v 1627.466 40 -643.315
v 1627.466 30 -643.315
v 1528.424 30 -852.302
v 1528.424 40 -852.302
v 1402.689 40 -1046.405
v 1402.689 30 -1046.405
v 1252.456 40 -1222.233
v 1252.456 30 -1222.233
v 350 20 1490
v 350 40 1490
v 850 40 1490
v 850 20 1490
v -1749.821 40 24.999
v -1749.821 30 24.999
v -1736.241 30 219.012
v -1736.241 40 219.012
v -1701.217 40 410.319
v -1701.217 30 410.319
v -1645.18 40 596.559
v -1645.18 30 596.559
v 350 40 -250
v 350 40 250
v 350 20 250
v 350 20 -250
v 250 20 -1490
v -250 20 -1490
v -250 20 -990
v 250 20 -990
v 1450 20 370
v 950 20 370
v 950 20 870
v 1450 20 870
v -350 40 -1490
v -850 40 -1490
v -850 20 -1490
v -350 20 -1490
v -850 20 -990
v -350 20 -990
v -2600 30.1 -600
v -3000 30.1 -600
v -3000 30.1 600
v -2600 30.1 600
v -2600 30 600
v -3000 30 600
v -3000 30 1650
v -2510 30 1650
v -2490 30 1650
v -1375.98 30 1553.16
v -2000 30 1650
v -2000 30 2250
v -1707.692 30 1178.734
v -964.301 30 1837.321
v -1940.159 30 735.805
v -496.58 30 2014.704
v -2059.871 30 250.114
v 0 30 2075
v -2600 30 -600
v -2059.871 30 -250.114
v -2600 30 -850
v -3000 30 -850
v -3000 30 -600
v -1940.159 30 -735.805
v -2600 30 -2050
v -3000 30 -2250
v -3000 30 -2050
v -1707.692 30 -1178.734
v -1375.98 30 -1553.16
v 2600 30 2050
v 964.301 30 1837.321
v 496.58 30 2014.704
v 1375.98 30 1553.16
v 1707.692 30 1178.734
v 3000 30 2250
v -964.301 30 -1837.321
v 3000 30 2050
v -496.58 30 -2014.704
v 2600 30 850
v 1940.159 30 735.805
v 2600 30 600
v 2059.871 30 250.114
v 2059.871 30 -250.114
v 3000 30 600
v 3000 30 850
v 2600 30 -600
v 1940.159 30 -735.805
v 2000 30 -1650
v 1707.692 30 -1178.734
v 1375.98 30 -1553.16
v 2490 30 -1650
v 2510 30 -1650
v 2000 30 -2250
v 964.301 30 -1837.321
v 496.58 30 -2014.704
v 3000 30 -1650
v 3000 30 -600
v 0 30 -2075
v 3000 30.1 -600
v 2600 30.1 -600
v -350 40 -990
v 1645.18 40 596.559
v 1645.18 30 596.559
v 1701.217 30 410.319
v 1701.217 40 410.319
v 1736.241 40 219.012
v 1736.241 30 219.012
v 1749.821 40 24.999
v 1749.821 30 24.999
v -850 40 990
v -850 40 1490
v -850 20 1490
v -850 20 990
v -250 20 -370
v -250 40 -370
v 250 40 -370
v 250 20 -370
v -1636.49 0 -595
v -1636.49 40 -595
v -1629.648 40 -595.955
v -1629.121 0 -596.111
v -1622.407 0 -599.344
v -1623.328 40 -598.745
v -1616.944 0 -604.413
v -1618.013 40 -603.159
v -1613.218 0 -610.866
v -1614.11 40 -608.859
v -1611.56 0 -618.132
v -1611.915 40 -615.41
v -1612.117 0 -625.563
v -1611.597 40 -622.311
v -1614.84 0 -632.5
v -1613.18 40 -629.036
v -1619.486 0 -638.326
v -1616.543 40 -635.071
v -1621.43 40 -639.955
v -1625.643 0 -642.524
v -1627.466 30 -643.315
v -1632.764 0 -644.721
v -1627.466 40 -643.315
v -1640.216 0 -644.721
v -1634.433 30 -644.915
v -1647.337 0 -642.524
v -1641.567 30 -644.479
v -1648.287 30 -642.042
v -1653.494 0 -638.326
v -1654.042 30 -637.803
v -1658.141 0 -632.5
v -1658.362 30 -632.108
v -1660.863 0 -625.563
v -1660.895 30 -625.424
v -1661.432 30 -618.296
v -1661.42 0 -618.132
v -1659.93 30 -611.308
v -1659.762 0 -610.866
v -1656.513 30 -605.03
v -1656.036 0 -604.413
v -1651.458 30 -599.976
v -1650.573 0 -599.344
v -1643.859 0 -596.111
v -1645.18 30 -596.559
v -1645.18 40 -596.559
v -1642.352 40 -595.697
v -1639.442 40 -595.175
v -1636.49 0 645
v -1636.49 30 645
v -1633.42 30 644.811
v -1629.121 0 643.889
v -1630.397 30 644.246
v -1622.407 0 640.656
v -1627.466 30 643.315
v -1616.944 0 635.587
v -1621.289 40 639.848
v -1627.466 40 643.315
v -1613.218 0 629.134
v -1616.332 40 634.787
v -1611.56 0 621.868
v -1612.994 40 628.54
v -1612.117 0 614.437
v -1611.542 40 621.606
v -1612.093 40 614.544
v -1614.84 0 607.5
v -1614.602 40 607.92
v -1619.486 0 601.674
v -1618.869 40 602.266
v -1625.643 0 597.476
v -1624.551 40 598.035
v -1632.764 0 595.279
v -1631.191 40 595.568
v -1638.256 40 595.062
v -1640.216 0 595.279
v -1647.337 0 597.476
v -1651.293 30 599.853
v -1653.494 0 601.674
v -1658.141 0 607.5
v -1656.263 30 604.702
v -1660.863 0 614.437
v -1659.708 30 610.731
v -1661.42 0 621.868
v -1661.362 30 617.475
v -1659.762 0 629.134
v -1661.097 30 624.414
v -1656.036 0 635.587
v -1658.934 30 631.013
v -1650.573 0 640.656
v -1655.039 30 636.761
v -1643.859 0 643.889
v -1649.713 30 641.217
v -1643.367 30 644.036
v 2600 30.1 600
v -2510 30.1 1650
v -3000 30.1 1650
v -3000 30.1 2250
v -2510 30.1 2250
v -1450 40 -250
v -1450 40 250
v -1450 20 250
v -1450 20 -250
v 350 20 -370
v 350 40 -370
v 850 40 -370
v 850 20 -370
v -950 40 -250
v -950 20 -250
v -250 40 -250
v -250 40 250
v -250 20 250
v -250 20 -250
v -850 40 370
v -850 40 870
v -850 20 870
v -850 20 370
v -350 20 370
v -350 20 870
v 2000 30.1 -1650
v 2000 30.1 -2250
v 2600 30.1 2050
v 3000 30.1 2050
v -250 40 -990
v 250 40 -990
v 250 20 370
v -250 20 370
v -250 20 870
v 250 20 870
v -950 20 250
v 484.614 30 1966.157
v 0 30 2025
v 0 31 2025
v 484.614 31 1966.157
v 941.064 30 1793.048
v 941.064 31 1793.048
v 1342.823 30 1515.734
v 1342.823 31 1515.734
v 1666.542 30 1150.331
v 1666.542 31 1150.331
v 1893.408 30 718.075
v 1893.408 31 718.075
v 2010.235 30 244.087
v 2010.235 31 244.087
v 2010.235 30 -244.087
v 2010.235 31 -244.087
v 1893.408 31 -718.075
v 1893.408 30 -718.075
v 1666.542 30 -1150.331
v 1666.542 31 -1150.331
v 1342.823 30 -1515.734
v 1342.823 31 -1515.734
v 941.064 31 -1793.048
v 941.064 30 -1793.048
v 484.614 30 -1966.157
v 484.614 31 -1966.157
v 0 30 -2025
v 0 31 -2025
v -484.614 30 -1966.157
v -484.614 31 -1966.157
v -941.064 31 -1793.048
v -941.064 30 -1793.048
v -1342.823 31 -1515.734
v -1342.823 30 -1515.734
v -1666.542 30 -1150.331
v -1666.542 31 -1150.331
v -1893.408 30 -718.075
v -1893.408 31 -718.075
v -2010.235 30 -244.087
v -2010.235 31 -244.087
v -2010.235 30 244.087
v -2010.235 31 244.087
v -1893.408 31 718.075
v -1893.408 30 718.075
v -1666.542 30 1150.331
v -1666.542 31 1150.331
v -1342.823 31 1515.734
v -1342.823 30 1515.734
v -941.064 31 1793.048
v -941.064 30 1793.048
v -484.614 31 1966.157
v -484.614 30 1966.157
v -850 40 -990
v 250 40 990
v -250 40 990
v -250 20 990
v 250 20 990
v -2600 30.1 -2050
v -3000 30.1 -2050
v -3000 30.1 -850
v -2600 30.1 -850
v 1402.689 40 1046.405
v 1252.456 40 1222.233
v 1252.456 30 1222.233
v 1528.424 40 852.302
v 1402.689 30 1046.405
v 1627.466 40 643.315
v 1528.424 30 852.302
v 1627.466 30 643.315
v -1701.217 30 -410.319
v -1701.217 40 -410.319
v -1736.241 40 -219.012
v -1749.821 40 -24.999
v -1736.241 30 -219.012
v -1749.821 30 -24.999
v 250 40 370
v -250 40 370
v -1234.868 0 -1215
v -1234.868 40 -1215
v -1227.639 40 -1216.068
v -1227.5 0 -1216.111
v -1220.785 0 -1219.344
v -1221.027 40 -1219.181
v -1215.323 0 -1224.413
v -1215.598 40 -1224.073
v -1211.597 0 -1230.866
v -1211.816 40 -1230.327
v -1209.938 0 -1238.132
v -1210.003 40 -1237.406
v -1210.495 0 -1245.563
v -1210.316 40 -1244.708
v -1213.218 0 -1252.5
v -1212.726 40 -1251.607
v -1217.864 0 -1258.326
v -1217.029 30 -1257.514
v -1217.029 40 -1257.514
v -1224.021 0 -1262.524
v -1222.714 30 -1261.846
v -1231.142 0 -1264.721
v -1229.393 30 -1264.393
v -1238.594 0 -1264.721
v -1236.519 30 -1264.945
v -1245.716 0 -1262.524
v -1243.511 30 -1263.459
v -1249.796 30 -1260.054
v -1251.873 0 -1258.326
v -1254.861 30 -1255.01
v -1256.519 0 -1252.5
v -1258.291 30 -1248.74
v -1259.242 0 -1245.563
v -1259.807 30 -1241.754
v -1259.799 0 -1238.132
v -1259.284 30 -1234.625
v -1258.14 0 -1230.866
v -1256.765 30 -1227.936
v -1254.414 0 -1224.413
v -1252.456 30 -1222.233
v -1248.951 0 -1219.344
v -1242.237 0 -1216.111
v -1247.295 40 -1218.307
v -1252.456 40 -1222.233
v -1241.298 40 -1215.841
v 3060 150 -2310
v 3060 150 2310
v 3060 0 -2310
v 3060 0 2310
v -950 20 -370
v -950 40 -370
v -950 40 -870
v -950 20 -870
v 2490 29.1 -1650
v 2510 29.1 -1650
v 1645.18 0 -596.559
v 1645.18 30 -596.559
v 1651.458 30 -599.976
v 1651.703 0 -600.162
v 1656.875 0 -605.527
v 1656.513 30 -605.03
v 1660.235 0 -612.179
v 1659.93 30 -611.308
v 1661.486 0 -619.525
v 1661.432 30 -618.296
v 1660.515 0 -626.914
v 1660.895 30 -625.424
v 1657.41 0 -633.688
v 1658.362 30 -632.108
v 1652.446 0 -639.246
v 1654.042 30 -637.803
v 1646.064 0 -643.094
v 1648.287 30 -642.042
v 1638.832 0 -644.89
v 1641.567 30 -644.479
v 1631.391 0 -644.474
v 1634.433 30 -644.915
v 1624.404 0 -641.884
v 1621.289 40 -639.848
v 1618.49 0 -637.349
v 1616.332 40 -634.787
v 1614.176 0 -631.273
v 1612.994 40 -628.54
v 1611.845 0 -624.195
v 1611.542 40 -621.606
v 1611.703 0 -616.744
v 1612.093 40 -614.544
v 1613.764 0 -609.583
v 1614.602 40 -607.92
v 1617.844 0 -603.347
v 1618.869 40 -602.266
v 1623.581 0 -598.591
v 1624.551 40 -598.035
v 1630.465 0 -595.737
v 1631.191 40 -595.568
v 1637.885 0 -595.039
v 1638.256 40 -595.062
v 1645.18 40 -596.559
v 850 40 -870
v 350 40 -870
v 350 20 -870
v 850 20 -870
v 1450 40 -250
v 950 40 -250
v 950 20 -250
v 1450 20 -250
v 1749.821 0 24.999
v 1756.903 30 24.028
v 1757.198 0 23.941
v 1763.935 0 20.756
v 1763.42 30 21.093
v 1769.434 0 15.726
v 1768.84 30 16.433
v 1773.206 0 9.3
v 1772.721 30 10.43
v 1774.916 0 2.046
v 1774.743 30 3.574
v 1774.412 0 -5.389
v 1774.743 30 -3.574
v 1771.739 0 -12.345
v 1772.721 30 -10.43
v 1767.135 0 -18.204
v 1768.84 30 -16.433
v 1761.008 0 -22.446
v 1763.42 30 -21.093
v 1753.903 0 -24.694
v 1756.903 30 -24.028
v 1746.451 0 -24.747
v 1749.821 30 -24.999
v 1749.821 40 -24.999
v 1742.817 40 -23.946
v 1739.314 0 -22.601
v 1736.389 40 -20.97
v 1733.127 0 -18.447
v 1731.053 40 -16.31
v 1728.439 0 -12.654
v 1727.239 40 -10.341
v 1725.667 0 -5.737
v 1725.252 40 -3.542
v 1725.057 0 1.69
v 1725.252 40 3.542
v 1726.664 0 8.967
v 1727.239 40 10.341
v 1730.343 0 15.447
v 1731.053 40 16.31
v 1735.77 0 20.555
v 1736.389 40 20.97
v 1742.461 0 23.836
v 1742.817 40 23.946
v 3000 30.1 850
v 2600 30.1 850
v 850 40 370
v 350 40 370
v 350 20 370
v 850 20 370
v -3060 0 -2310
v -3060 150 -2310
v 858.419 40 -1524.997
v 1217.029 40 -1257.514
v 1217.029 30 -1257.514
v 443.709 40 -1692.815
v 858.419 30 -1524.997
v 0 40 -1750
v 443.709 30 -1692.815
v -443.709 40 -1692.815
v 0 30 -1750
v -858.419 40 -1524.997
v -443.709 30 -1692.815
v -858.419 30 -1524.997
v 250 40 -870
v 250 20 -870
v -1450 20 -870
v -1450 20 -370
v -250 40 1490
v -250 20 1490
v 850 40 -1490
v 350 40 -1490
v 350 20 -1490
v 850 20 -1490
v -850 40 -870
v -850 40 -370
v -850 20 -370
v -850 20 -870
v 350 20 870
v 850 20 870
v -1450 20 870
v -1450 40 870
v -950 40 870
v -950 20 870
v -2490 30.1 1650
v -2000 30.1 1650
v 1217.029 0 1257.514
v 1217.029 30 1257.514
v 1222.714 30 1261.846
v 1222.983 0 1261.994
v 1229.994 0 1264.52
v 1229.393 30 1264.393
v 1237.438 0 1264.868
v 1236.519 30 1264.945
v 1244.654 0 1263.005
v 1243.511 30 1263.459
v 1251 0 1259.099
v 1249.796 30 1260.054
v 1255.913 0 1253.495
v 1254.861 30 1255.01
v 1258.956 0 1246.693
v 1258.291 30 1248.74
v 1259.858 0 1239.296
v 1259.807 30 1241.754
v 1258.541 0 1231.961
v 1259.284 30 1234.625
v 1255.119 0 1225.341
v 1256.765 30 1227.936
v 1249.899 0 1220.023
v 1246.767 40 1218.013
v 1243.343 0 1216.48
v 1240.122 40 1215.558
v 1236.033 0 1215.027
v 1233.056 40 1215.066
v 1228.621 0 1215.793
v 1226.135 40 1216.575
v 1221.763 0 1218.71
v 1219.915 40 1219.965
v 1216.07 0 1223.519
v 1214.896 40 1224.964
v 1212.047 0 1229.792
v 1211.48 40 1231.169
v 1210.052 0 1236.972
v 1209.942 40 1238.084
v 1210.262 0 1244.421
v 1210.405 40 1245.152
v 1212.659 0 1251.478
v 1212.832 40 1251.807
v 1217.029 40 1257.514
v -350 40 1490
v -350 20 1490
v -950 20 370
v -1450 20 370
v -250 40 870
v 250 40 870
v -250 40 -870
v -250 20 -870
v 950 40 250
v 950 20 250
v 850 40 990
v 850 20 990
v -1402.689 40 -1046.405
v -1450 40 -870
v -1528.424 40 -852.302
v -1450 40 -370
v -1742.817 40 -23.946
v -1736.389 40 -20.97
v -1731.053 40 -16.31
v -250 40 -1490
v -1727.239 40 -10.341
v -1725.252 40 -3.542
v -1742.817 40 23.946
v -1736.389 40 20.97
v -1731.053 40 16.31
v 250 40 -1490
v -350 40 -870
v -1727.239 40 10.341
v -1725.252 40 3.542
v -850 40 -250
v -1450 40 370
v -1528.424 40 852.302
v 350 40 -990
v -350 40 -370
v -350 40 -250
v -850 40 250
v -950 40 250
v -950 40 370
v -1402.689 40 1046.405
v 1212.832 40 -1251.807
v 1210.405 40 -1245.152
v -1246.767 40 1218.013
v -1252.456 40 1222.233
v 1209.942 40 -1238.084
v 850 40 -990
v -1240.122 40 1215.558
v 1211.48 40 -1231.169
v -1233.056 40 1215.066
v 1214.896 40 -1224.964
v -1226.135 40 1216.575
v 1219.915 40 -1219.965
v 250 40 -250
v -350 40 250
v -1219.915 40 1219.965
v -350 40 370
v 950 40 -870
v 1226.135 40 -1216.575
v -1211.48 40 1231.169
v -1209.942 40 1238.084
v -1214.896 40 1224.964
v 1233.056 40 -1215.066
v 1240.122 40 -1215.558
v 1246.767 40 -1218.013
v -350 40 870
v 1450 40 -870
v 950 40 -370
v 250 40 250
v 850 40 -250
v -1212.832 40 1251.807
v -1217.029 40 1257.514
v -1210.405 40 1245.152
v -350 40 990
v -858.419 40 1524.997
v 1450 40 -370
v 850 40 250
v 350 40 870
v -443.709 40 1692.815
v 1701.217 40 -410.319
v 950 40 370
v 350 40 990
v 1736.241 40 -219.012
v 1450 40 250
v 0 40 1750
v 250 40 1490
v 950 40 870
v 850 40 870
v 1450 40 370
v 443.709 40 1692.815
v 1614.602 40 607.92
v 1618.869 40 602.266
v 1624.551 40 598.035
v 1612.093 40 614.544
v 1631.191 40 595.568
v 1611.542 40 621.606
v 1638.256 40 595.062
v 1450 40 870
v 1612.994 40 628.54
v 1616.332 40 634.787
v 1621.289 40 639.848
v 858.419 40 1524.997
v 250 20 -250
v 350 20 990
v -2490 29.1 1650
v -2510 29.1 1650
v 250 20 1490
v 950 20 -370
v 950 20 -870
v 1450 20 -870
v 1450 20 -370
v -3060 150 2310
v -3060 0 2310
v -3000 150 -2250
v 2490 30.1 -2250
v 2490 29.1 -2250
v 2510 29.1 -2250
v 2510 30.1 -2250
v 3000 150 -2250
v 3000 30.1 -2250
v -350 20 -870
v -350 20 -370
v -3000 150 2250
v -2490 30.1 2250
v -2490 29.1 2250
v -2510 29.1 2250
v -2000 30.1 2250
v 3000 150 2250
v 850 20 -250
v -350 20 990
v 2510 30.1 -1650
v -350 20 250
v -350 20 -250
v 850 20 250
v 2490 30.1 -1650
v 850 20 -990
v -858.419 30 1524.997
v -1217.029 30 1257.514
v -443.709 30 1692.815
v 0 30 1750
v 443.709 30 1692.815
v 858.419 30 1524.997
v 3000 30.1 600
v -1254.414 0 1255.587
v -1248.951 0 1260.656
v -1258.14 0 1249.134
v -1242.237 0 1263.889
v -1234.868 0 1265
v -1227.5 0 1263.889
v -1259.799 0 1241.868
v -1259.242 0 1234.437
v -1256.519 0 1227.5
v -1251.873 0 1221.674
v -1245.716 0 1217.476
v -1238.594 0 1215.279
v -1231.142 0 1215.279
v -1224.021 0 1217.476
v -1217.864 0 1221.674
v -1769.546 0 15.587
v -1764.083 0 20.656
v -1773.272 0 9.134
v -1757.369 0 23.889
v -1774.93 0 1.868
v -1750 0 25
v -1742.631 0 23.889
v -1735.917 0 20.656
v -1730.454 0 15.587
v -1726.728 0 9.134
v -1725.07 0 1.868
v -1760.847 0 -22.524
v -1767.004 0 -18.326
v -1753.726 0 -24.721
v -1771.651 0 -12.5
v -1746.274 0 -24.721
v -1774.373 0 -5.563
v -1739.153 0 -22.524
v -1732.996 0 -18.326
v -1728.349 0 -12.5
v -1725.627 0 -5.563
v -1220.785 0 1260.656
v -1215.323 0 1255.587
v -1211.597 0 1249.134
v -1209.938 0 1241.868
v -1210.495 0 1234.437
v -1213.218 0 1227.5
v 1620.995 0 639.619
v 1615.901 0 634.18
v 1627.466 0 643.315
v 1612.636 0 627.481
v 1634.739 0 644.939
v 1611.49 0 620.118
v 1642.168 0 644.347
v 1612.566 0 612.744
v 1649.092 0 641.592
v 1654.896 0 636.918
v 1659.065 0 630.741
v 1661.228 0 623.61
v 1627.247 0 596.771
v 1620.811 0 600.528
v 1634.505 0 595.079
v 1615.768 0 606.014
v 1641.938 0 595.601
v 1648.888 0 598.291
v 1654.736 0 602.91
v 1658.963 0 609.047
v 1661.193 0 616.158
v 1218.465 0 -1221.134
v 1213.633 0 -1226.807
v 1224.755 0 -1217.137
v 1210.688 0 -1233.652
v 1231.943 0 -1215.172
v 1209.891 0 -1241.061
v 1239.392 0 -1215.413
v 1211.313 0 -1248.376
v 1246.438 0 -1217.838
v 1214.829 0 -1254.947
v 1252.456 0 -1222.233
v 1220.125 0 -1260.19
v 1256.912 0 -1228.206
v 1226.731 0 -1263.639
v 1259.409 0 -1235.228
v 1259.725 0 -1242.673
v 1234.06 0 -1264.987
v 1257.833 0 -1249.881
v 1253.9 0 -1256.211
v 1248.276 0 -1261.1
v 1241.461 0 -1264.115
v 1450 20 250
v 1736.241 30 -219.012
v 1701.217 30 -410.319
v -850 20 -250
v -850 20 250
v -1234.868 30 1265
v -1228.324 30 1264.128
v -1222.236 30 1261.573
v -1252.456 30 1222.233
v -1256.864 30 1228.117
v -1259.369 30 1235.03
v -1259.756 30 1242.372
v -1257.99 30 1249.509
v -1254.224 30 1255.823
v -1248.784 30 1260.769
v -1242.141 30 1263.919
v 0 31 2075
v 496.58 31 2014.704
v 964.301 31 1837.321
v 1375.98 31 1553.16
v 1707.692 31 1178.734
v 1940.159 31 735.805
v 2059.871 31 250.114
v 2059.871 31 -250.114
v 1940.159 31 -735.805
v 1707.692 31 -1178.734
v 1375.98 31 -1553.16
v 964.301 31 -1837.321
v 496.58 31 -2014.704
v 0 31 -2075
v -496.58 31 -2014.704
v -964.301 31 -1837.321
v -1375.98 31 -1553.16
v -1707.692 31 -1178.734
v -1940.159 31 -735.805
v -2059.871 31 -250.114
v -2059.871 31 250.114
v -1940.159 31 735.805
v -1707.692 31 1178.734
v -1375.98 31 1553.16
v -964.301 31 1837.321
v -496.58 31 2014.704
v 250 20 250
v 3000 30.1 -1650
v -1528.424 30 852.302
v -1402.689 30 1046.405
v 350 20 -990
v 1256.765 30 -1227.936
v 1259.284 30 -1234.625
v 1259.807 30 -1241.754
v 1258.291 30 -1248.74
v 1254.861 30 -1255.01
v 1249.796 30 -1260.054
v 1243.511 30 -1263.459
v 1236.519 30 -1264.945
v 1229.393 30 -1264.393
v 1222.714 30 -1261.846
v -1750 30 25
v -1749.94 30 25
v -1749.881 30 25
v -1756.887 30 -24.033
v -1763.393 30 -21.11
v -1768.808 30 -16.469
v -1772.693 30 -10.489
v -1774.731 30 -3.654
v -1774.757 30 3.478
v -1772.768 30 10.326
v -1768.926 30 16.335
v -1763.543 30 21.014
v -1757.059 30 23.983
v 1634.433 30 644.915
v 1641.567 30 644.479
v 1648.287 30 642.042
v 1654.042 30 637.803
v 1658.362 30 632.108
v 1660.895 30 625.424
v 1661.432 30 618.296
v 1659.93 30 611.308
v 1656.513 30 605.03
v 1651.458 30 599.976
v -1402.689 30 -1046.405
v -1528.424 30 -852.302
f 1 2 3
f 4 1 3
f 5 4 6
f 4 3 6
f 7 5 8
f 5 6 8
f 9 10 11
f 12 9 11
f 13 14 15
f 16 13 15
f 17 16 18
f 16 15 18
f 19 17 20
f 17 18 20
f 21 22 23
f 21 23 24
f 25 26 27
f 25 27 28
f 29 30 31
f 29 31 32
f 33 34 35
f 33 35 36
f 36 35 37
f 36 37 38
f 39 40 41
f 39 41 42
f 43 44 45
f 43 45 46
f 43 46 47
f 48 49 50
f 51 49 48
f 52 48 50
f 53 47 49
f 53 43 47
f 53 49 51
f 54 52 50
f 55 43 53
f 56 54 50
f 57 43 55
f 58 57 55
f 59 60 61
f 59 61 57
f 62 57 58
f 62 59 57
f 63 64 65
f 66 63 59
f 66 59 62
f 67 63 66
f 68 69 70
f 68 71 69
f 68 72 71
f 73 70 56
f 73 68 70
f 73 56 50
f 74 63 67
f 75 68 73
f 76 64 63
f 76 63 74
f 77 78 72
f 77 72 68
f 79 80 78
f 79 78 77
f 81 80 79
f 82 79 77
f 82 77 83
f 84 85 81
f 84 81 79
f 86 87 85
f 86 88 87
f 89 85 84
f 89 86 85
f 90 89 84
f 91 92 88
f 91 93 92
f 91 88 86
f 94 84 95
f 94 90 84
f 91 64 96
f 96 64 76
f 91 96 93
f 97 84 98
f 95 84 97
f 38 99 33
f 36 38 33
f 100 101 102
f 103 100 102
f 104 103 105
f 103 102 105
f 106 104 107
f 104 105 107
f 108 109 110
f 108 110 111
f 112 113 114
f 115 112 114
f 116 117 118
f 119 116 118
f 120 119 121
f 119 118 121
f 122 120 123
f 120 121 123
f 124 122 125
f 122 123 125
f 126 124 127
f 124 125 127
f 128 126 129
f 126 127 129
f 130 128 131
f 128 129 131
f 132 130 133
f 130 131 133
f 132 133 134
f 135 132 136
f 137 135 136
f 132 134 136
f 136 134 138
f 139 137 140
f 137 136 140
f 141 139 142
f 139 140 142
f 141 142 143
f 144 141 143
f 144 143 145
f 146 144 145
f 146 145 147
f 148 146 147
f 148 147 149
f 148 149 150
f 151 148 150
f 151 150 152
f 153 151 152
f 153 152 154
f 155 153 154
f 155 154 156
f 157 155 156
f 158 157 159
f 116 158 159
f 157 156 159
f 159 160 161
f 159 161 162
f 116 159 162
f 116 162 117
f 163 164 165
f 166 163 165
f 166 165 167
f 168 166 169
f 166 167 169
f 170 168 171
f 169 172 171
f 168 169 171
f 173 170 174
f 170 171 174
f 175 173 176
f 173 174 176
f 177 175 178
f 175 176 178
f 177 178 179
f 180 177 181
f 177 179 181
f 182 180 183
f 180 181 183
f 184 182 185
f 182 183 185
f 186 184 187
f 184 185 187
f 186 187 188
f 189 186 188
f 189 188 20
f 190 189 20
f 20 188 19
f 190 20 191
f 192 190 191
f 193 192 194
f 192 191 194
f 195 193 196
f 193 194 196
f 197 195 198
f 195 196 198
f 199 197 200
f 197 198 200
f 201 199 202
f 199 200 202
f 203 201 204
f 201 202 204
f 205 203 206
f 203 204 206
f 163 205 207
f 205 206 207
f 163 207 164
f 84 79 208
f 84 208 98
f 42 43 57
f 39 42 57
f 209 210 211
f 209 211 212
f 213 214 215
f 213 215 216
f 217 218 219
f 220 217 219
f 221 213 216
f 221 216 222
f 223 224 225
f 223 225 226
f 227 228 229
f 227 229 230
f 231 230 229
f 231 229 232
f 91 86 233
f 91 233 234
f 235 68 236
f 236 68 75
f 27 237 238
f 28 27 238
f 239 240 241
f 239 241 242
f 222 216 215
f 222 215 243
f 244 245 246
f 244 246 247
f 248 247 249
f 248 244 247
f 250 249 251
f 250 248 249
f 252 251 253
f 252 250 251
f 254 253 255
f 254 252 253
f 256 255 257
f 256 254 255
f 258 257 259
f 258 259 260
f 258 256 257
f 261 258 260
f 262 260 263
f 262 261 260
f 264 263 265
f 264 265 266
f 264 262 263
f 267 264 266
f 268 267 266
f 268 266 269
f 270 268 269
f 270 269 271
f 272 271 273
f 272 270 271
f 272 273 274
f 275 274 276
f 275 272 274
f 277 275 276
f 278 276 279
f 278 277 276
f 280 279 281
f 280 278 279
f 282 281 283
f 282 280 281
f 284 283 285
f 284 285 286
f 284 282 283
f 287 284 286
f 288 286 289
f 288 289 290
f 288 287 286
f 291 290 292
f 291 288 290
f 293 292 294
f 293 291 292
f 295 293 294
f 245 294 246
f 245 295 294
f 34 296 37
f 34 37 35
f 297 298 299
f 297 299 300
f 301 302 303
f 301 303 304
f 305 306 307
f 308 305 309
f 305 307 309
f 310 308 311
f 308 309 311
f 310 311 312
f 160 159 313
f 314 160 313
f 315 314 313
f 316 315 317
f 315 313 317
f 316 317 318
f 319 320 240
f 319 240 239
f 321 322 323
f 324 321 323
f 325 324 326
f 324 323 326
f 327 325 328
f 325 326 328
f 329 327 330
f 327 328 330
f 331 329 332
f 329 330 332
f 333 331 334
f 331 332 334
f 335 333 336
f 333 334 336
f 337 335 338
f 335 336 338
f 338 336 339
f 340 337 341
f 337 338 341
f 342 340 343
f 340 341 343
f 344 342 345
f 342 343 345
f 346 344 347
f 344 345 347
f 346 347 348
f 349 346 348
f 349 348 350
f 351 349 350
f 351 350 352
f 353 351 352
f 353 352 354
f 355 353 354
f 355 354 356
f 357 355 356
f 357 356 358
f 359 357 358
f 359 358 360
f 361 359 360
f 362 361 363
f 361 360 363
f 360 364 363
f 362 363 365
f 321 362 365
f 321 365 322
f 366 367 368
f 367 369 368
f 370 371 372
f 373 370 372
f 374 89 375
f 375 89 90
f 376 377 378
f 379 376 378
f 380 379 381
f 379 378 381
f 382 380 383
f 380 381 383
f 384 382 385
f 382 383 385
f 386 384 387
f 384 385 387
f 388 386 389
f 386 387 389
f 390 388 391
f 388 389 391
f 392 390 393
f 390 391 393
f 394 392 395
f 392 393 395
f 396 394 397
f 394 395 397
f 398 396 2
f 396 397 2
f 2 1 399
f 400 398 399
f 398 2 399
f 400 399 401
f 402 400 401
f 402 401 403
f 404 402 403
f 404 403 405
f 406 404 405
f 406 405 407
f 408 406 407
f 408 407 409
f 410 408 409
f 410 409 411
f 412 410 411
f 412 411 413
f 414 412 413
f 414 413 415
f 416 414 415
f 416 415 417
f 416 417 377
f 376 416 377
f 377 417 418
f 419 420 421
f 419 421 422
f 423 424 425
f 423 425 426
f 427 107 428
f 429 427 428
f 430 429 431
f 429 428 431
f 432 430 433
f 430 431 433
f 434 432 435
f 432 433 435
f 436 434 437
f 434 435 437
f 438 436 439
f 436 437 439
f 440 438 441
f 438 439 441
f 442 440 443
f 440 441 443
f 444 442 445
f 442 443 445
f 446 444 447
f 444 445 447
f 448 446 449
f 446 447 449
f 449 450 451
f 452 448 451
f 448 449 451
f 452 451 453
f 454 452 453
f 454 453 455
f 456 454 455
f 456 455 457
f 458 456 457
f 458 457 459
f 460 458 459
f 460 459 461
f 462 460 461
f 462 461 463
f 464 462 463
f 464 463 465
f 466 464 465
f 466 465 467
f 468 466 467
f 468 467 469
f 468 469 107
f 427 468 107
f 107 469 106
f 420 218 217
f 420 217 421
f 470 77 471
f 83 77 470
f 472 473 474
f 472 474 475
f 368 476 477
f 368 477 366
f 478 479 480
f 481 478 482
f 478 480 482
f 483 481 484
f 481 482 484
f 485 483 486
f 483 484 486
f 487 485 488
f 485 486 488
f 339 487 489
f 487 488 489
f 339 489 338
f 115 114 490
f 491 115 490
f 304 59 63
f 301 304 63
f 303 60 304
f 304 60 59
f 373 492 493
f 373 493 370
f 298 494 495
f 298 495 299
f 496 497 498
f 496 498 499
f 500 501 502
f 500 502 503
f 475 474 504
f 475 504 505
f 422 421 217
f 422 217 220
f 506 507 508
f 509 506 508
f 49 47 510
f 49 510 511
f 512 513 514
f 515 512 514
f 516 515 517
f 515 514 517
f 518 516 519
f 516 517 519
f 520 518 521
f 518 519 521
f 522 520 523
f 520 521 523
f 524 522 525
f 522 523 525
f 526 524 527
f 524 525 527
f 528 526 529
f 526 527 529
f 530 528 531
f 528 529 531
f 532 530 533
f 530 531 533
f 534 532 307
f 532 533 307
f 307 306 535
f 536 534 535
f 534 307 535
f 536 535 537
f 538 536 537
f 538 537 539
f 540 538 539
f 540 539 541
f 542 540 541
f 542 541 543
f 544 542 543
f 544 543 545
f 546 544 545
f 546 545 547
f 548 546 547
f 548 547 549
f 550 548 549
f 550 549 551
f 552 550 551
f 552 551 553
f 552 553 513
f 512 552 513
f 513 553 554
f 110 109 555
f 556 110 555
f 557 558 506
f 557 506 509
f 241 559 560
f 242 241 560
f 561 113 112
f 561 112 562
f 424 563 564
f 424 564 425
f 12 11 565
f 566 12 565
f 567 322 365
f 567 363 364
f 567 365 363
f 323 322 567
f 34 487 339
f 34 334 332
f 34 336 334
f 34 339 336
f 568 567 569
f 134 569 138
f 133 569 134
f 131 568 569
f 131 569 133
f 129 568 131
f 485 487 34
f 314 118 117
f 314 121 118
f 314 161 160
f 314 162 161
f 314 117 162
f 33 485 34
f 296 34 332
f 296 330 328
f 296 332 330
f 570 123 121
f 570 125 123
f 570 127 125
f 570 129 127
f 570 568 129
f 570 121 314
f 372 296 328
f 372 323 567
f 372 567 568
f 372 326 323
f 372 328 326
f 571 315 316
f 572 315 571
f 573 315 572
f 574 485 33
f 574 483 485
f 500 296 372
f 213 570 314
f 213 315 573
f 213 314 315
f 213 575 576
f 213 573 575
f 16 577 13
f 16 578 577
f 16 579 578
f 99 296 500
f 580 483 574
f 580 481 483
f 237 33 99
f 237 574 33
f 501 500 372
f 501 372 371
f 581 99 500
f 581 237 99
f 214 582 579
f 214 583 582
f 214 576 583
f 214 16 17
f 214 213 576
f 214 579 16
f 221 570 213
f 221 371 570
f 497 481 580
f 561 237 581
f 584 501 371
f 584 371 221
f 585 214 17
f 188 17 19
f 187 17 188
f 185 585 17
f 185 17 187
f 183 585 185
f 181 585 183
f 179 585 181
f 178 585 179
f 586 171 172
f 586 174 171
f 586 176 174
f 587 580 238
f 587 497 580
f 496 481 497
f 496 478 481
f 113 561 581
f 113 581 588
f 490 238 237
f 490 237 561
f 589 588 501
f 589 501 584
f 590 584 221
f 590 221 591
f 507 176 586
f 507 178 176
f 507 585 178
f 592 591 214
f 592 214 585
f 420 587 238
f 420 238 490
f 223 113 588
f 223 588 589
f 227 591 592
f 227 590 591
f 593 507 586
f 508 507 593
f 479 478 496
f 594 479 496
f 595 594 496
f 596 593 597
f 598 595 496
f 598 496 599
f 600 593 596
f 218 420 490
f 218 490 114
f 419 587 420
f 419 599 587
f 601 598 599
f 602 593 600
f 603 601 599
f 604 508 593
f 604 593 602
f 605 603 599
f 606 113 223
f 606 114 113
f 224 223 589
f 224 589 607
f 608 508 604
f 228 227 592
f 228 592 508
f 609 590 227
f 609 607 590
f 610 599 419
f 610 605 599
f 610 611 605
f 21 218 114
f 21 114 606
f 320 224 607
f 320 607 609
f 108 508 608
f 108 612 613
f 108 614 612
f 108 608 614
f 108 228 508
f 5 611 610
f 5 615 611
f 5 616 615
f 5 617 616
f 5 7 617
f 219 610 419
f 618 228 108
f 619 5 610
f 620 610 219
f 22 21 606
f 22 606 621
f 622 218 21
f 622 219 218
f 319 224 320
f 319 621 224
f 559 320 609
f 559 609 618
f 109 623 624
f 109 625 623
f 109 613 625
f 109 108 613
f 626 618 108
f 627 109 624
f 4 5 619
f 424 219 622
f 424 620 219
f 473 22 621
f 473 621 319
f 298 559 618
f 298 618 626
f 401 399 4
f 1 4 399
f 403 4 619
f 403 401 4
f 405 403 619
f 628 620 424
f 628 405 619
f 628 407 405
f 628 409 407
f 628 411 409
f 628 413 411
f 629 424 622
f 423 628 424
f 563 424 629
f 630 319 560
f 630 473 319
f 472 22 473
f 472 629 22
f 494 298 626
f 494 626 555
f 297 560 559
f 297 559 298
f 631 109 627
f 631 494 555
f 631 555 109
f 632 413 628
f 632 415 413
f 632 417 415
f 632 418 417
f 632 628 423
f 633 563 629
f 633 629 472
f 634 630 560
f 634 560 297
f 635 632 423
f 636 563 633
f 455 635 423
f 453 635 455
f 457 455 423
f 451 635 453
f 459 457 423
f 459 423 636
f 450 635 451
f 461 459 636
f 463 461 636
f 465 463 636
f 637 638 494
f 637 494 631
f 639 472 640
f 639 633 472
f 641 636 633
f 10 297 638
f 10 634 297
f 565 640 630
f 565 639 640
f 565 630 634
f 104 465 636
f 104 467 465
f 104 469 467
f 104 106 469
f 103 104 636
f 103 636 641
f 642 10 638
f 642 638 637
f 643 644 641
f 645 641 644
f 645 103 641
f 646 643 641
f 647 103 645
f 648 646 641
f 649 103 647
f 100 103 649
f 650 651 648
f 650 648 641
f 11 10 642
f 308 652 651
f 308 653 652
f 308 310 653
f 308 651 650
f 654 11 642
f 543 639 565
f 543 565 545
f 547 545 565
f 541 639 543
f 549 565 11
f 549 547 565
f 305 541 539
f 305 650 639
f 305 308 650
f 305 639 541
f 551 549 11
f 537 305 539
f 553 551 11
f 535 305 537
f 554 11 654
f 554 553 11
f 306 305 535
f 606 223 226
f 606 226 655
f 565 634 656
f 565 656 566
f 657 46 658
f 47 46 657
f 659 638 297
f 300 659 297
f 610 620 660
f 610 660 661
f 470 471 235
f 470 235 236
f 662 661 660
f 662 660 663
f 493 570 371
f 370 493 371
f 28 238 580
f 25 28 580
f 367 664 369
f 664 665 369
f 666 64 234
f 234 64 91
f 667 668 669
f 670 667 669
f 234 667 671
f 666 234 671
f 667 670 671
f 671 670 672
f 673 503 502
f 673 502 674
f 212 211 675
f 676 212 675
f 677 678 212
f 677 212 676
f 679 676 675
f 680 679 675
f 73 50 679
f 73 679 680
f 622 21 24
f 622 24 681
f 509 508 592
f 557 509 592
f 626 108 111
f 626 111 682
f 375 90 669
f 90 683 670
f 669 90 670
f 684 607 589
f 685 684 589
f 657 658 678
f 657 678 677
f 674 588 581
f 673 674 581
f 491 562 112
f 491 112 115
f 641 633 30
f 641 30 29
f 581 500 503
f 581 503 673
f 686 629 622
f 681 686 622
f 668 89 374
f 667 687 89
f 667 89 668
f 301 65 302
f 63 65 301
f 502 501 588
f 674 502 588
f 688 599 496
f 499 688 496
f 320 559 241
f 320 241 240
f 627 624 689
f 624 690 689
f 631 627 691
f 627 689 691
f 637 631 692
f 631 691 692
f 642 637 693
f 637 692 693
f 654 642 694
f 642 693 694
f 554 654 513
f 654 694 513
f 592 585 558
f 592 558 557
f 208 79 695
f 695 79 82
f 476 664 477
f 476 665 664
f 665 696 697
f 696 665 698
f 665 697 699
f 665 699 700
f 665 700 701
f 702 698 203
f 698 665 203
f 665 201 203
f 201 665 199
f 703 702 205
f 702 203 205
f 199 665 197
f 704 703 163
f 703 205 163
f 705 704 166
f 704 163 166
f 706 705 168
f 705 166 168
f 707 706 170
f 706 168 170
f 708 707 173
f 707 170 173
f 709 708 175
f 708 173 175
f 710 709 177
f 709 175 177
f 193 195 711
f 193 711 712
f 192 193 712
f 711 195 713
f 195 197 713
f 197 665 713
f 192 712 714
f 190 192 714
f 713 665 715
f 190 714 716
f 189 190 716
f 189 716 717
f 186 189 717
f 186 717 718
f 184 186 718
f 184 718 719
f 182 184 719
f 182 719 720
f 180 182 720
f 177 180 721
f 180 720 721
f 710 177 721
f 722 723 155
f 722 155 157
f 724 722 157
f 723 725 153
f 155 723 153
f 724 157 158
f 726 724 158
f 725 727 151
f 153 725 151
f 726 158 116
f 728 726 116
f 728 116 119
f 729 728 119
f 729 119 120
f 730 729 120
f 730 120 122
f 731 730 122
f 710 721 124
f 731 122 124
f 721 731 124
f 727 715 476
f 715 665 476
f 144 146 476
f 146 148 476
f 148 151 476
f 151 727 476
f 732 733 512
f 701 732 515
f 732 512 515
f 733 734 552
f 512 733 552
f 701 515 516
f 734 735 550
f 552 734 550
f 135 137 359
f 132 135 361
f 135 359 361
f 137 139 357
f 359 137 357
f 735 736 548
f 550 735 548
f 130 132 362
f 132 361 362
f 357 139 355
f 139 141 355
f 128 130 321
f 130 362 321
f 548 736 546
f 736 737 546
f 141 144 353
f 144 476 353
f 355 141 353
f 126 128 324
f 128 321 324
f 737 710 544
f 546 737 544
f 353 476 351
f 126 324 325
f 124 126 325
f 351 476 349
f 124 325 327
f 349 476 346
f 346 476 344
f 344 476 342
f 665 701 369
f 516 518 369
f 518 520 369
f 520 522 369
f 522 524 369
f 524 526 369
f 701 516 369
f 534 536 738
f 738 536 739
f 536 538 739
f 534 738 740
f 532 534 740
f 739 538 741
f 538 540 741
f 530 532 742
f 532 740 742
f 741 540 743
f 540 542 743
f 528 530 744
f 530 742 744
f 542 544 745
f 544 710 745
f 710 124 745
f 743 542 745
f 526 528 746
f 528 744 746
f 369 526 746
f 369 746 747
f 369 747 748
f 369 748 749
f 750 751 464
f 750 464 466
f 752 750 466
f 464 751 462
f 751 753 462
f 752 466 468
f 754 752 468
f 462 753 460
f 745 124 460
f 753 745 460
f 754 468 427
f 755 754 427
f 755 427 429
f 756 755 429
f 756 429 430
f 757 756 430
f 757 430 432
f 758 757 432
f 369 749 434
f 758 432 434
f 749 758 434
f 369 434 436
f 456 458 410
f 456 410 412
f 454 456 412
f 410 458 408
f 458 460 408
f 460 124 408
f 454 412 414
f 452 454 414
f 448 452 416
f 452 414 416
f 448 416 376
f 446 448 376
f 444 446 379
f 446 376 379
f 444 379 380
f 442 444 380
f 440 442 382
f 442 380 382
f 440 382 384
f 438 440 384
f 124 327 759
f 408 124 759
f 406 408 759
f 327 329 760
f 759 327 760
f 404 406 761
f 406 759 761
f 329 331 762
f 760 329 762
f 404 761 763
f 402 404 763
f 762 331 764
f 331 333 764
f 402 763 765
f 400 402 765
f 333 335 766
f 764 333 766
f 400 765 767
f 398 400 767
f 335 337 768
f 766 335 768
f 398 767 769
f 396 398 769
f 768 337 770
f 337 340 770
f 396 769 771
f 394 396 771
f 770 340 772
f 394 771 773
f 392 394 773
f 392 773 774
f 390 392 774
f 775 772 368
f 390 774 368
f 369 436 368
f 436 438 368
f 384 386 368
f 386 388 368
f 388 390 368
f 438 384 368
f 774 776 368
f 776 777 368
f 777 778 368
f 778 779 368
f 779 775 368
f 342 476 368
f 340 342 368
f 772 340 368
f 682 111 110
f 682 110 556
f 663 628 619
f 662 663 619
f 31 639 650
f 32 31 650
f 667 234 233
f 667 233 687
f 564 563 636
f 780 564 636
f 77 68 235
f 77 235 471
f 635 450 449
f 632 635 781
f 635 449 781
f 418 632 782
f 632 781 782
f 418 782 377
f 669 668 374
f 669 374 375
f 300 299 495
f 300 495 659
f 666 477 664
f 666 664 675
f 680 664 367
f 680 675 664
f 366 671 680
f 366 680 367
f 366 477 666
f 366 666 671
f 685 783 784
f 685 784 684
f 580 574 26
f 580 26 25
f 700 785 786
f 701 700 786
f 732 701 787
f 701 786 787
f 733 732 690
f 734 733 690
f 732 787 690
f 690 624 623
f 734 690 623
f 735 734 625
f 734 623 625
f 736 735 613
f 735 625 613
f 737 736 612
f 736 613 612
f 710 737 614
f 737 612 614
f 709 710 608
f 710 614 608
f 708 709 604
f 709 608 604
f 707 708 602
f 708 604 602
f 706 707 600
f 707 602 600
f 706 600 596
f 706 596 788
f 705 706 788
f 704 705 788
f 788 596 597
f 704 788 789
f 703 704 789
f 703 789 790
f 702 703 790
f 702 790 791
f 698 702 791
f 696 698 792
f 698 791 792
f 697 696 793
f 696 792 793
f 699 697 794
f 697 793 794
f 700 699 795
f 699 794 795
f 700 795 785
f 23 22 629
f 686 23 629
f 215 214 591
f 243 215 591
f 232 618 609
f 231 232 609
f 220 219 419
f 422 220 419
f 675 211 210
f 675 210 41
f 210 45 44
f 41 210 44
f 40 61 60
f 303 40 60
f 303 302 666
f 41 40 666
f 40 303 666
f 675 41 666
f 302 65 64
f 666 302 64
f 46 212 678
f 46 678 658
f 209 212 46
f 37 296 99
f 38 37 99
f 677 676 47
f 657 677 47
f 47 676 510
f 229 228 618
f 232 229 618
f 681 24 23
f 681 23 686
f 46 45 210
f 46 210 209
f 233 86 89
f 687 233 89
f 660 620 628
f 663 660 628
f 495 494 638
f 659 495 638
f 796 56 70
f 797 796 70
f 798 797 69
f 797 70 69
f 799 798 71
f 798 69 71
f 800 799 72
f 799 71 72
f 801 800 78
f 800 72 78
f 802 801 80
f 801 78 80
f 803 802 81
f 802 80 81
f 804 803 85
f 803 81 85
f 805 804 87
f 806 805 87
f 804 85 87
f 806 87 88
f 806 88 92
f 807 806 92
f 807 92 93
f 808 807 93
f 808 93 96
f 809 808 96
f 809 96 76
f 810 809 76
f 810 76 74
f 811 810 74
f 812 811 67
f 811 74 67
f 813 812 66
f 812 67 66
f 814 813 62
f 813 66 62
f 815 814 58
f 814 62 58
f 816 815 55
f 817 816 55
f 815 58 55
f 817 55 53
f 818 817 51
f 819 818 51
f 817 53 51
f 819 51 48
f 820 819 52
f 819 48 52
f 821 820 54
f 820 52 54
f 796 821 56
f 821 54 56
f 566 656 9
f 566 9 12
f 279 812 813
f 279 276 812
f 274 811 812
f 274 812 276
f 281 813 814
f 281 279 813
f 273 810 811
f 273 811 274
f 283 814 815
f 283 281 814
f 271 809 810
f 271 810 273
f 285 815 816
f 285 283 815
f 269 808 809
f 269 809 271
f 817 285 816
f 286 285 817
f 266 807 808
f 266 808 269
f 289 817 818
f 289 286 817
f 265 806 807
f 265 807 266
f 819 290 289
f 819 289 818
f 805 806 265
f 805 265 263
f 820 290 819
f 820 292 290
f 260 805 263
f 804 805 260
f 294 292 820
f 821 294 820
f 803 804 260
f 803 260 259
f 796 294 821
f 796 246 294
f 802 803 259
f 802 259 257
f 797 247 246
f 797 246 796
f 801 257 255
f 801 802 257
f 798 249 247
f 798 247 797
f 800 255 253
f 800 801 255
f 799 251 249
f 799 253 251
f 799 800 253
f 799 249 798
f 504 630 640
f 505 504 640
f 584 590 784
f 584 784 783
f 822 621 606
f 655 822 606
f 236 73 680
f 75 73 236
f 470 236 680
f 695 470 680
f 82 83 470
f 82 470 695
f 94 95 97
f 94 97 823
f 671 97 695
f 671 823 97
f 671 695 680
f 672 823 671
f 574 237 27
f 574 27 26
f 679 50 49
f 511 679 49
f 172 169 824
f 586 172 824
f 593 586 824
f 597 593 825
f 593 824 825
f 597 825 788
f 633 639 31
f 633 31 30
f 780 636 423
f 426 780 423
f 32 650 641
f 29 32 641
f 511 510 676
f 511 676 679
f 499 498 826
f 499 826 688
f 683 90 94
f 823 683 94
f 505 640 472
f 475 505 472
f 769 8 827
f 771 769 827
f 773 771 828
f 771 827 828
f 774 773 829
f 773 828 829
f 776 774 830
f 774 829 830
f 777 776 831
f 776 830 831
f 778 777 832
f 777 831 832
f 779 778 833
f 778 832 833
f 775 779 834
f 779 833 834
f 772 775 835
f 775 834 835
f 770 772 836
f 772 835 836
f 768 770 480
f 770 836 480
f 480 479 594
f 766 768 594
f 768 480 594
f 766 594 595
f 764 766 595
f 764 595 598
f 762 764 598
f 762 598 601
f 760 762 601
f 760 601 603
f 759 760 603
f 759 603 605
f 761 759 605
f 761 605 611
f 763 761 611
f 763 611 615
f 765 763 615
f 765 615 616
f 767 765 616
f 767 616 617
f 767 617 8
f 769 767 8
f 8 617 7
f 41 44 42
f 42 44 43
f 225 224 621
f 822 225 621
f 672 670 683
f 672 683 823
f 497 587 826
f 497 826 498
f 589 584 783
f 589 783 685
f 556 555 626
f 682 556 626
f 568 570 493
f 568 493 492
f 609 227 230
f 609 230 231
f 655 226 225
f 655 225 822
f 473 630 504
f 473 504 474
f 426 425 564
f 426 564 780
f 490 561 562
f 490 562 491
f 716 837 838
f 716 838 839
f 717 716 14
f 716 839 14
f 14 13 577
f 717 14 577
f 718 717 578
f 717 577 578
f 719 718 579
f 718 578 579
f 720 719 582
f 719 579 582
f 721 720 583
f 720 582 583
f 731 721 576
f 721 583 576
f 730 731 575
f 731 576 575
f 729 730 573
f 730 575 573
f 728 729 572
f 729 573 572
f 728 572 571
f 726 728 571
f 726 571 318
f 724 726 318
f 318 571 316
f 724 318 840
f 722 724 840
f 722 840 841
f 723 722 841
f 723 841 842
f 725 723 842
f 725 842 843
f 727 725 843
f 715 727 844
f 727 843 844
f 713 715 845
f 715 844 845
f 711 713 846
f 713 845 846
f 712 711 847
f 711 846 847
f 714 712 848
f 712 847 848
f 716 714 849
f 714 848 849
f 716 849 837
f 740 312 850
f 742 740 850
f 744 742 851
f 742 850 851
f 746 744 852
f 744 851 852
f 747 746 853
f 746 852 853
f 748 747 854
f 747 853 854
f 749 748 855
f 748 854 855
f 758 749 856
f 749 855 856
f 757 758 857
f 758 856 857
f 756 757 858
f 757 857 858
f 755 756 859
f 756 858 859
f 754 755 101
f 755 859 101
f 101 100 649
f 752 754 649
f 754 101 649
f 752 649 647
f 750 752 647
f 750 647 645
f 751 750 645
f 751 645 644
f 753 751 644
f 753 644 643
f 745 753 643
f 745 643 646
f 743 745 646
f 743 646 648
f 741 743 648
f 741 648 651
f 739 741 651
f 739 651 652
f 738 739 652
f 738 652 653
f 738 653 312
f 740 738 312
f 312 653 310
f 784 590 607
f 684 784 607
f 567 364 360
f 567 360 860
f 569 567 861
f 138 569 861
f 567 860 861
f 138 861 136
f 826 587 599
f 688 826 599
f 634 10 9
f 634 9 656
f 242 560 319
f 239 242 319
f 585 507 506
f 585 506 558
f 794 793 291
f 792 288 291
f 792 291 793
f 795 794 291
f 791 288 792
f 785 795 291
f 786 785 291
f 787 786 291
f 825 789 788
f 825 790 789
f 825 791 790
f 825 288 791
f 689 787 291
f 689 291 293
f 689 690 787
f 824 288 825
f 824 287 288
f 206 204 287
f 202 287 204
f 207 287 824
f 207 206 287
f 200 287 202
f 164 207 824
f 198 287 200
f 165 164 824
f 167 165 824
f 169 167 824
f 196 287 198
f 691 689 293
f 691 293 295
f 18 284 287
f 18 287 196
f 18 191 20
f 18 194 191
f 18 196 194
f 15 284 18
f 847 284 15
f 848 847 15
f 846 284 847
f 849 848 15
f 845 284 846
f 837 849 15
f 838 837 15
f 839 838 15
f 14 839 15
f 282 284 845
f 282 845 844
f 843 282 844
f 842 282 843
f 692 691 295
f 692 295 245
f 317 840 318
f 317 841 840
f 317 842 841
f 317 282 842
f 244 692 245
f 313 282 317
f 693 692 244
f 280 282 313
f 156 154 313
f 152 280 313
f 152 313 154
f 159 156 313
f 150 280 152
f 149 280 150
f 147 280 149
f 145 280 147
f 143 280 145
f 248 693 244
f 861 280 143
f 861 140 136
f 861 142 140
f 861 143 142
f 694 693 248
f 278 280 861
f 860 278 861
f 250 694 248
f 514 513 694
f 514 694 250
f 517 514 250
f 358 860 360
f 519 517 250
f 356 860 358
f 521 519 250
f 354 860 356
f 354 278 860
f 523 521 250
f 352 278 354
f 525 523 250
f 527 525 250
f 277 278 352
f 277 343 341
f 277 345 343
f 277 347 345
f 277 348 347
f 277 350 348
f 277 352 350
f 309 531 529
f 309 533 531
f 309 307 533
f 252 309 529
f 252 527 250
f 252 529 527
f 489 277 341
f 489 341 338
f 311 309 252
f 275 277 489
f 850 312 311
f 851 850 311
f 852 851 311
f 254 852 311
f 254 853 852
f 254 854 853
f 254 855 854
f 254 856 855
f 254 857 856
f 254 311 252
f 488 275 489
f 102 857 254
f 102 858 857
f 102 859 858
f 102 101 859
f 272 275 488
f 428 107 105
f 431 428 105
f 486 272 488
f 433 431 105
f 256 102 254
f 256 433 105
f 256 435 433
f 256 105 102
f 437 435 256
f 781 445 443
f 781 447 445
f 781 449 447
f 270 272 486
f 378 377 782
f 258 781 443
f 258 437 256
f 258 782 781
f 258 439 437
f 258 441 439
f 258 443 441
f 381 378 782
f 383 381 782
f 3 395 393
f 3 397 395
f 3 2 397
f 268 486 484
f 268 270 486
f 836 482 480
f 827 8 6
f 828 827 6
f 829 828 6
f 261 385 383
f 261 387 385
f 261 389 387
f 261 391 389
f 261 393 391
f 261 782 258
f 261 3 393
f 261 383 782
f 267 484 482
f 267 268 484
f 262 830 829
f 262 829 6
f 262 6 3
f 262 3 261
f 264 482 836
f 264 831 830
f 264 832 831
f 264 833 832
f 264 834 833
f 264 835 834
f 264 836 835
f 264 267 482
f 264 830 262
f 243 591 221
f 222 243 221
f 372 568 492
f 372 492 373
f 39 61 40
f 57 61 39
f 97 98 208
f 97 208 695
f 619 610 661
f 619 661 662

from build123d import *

# Parameters (mm, degrees)
SKETCH1_W           = 6120
SKETCH1_H           = 4620
BOSS_EXTRUDE1_DEPTH = 30
SKETCH2_W           = 6120
SKETCH2_H           = 4620
SKETCH2_W_2         = 6000
SKETCH2_H_2         = 4500
BOSS_EXTRUDE2_DEPTH = 120
SKETCH3_R           = 1750
BOSS_EXTRUDE3_DEPTH = 10
SKETCH4_W           = 500
SKETCH4_H           = 500
CUT_EXTRUDE1_DEPTH  = 20
SKETCH12_R          = 2075
SKETCH12_R_2        = 2025
BOSS_EXTRUDE8_DEPTH = 1
SKETCH13_W          = 1000
SKETCH13_H          = 600
SKETCH13_W_2        = 400
SKETCH13_H_2        = 1200
BOSS_EXTRUDE9_DEPTH = 0.1
SKETCH14_R          = 25
CUT_EXTRUDE2_DEPTH  = 40
SKETCH15_W          = 20
SKETCH15_H          = 600
CUT_EXTRUDE3_DEPTH  = 1


with BuildPart() as part:
    # Sketch1 → Boss-Extrude1 (new body)
    with BuildSketch(Plane(origin=(0, 0, 0), x_dir=(1, 0, 0), z_dir=(0, 1, 0))):
        Rectangle(SKETCH1_W, SKETCH1_H)
    extrude(amount=BOSS_EXTRUDE1_DEPTH)

    # Sketch2 → Boss-Extrude2 (add)
    with BuildSketch(Plane(origin=(0, 30, 0), x_dir=(1, 0, 0), z_dir=(0, 1, 0))):
        Rectangle(SKETCH2_W, SKETCH2_H)
        Rectangle(SKETCH2_W_2, SKETCH2_H_2, mode=Mode.SUBTRACT)
    extrude(amount=BOSS_EXTRUDE2_DEPTH)

    # Sketch3 → Boss-Extrude3 (add)
    with BuildSketch(Plane(origin=(0, 30, 0), x_dir=(1, 0, 0), z_dir=(0, 1, 0))):
        with Locations(Location((0, 0, 0), (0, 0, 270))):
            Circle(SKETCH3_R)
    extrude(amount=BOSS_EXTRUDE3_DEPTH)

    # Sketch4 → Cut-Extrude1 (cut)
    with BuildSketch(Plane(origin=(0, 40, 0), x_dir=(1, 0, 0), z_dir=(0, 1, 0))):
        with Locations((600, 0)):
            Rectangle(SKETCH4_W, SKETCH4_H)
        Rectangle(SKETCH4_W, SKETCH4_H)
        with Locations((1200, 0)):
            Rectangle(SKETCH4_W, SKETCH4_H)
        with Locations((-1200, 0)):
            Rectangle(SKETCH4_W, SKETCH4_H)
        with Locations((-600, 0)):
            Rectangle(SKETCH4_W, SKETCH4_H)
        with Locations((0, 620)):
            Rectangle(SKETCH4_W, SKETCH4_H)
        with Locations((-600, 620)):
            Rectangle(SKETCH4_W, SKETCH4_H)
        with Locations((600, 620)):
            Rectangle(SKETCH4_W, SKETCH4_H)
        with Locations((0, 1240)):
            Rectangle(SKETCH4_W, SKETCH4_H)
        with Locations((-600, 1240)):
            Rectangle(SKETCH4_W, SKETCH4_H)
        with Locations((600, 1240)):
            Rectangle(SKETCH4_W, SKETCH4_H)
        with Locations((600, -1240)):
            Rectangle(SKETCH4_W, SKETCH4_H)
        with Locations((-600, -1240)):
            Rectangle(SKETCH4_W, SKETCH4_H)
        with Locations((0, -1240)):
            Rectangle(SKETCH4_W, SKETCH4_H)
        with Locations((600, -620)):
            Rectangle(SKETCH4_W, SKETCH4_H)
        with Locations((-600, -620)):
            Rectangle(SKETCH4_W, SKETCH4_H)
        with Locations((0, -620)):
            Rectangle(SKETCH4_W, SKETCH4_H)
        with Locations((-1200, 620)):
            Rectangle(SKETCH4_W, SKETCH4_H)
        with Locations((1200, 620)):
            Rectangle(SKETCH4_W, SKETCH4_H)
        with Locations((1200, -620)):
            Rectangle(SKETCH4_W, SKETCH4_H)
        with Locations((-1200, -620)):
            Rectangle(SKETCH4_W, SKETCH4_H)
    extrude(amount=-CUT_EXTRUDE1_DEPTH, mode=Mode.SUBTRACT)

    # Sketch12 → Boss-Extrude8 (add)
    with BuildSketch(Plane(origin=(0, 30, 0), x_dir=(1, 0, 0), z_dir=(0, 1, 0))):
        with Locations(Location((0, 0, 0), (0, 0, 270))):
            Circle(SKETCH12_R)
        with Locations(Location((0, 0, 0), (0, 0, 270))):
            Circle(SKETCH12_R_2, mode=Mode.SUBTRACT)
    extrude(amount=BOSS_EXTRUDE8_DEPTH)

    # Sketch13 → Boss-Extrude9 (add)
    with BuildSketch(Plane(origin=(0, 30, 0), x_dir=(1, 0, 0), z_dir=(0, 1, 0))):
        with Locations((-2500, -1950)):
            Rectangle(SKETCH13_W, SKETCH13_H)
        with Locations((-2800, 0)):
            Rectangle(SKETCH13_W_2, SKETCH13_H_2)
        with Locations((-2800, 1450)):
            Rectangle(SKETCH13_W_2, SKETCH13_H_2)
        with Locations((2500, 1950)):
            Rectangle(SKETCH13_W, SKETCH13_H)
        with Locations((2800, 0)):
            Rectangle(SKETCH13_W_2, SKETCH13_H_2)
        with Locations((2800, -1450)):
            Rectangle(SKETCH13_W_2, SKETCH13_H_2)
    extrude(amount=BOSS_EXTRUDE9_DEPTH)

    # Sketch14 → Cut-Extrude2 (cut)
    with BuildSketch(Plane(origin=(0, 40, 0), x_dir=(1, 0, 0), z_dir=(0, 1, 0))):
        with Locations(Location((-1636.490146625, -620, 0), (0, 0, 270))):
            Circle(SKETCH14_R)
        with Locations(Location((-1234.868414043, -1240, 0), (0, 0, 270))):
            Circle(SKETCH14_R)
        with Locations(Location((-1750, 0, 0), (0, 0, 270))):
            Circle(SKETCH14_R)
        with Locations(Location((-1636.490146625, 620, 0), (0, 0, 270))):
            Circle(SKETCH14_R)
        with Locations(Location((-1234.868414043, 1240, 0), (0, 0, 270))):
            Circle(SKETCH14_R)
        with Locations(Location((1234.868414043, 1240, 0), (0, 0, 314.709542337))):
            Circle(SKETCH14_R)
        with Locations(Location((1636.490146625, 620, 0), (0, 0, 290.340414768))):
            Circle(SKETCH14_R)
        with Locations(Location((1750, 0, 0), (0, 0, 269.590740952))):
            Circle(SKETCH14_R)
        with Locations(Location((1234.868414043, -1240, 0), (0, 0, 224.471939567))):
            Circle(SKETCH14_R)
        with Locations(Location((1636.490146625, -620, 0), (0, 0, 248.841067136))):
            Circle(SKETCH14_R)
    extrude(amount=-CUT_EXTRUDE2_DEPTH, mode=Mode.SUBTRACT)

    # Sketch15 → Cut-Extrude3 (cut)
    with BuildSketch(Plane(origin=(0, 30.1, 0), x_dir=(1, 0, 0), z_dir=(0, 1, 0))):
        with Locations((-2500, -1950)):
            Rectangle(SKETCH15_W, SKETCH15_H)
        with Locations((2500, 1950)):
            Rectangle(SKETCH15_W, SKETCH15_H)
    extrude(amount=-CUT_EXTRUDE3_DEPTH, mode=Mode.SUBTRACT)


solid = part.part
